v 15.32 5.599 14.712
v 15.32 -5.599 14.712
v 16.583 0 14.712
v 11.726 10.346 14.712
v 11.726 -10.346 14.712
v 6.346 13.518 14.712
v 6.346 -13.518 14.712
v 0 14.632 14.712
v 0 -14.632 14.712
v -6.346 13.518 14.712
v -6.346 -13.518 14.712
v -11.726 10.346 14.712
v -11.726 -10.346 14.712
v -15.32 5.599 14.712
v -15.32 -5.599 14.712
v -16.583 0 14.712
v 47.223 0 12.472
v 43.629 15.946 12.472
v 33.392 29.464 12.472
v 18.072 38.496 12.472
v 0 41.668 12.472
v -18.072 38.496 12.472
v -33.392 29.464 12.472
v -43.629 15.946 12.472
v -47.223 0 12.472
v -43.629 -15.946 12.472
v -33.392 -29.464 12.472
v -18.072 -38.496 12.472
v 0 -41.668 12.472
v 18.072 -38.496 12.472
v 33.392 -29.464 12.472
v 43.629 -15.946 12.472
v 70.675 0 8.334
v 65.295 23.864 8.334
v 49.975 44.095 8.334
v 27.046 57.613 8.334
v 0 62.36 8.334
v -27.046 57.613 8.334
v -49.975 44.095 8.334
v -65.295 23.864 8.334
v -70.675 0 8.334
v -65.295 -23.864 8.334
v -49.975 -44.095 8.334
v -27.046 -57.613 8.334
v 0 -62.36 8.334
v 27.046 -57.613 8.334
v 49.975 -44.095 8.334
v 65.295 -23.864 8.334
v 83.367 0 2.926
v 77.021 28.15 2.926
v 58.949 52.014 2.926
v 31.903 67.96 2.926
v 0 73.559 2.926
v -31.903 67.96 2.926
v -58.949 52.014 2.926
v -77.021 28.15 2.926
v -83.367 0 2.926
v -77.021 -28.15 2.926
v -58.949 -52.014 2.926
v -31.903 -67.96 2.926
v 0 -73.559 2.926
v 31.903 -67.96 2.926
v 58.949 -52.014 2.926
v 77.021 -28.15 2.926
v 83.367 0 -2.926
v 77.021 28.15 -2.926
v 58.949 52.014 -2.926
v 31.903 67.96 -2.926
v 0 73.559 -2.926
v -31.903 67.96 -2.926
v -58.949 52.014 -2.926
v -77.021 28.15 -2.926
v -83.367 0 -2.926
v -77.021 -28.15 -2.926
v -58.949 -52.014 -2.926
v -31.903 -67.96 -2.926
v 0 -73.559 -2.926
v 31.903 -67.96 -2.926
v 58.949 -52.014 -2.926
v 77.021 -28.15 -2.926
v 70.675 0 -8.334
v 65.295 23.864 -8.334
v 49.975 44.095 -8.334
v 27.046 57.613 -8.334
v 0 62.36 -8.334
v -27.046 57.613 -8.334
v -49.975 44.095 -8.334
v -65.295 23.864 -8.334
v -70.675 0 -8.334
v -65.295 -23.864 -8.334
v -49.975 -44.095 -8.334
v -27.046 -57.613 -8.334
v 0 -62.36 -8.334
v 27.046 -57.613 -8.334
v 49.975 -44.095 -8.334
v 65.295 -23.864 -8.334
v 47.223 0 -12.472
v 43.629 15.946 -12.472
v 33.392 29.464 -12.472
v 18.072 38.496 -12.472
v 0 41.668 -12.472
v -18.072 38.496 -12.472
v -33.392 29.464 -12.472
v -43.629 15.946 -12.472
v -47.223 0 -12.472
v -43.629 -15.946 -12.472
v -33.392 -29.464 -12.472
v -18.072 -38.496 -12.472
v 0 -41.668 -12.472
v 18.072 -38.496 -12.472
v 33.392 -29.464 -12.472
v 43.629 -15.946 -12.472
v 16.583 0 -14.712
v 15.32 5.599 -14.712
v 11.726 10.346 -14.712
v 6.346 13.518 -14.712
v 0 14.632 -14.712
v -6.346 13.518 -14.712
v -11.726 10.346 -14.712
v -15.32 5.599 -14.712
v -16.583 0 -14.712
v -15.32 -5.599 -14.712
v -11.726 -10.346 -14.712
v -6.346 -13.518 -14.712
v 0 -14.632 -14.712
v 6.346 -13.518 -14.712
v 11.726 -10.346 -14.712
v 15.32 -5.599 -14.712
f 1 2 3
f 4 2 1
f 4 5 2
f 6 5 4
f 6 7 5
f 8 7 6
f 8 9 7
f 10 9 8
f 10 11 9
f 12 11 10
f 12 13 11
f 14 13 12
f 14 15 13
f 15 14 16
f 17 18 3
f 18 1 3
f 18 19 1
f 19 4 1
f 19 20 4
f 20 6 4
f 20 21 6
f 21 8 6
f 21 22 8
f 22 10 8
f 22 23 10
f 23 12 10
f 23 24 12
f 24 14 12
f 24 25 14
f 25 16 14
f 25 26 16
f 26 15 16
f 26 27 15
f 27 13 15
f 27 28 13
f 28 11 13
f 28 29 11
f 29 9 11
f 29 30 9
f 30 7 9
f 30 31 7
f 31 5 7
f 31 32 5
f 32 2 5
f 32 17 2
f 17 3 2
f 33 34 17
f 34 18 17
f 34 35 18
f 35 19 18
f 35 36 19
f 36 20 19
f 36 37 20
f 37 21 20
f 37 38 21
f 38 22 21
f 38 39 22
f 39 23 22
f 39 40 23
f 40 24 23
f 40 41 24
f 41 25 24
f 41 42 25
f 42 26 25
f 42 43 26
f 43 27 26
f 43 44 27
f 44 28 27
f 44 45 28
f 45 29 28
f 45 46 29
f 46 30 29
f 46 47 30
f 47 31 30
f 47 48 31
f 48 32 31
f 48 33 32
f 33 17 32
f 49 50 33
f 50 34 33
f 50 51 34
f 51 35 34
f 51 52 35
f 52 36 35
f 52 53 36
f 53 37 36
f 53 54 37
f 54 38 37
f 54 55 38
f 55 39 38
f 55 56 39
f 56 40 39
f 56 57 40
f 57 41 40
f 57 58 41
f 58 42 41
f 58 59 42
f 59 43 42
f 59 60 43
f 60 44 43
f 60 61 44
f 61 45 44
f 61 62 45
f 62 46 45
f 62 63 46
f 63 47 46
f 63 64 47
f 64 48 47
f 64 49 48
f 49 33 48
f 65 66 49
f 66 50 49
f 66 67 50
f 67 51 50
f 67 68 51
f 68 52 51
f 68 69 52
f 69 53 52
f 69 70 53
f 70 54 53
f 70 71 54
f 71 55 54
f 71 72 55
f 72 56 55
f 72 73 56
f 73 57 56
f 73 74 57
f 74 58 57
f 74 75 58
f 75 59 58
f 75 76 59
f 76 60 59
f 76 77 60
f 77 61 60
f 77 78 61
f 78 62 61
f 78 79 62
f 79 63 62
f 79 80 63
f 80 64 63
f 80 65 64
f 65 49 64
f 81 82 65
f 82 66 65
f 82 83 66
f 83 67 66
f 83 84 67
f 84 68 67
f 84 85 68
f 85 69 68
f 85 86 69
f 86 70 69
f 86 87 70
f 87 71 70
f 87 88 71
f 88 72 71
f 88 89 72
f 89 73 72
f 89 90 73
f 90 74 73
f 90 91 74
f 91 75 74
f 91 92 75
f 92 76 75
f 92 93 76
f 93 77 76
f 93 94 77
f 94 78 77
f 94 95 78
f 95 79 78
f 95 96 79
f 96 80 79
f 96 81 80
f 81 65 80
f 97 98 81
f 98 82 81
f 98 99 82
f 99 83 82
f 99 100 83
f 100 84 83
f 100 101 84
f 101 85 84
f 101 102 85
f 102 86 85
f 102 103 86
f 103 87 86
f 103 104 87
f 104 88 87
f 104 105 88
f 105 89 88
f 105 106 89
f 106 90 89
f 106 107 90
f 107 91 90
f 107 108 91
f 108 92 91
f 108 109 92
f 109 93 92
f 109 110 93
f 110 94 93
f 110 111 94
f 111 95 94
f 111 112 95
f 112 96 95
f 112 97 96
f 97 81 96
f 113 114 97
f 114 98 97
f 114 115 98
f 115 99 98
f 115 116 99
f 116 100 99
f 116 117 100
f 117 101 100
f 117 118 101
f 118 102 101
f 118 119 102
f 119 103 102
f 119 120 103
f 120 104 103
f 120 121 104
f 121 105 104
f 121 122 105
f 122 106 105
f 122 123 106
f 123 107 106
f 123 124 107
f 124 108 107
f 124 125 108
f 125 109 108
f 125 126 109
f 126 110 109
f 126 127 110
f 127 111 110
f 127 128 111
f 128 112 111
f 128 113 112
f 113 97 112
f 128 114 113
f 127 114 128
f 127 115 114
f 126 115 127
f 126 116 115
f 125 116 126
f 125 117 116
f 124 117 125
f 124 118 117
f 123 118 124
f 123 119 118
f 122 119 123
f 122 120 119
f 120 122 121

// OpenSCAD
// Generated by SolidPython 1.0.1 on 2020-07-29 00:46:53


scale(v = [17, 15, 3]) {
	sphere(r = 5);
}
/***********************************************
*********      SolidPython code:      **********
************************************************
 
# import packages: SolidPython
from solid import *
from solid.utils import *
from itertools import chain, combinations, permutations


class Resize:

    def __init__(self, scad_file):
        self.scad_file = scad_file
        #self.scad_file = import_scad(scad_file)
        # cone/cylinder param:
        self.r1 = 0
        self.r2 = 0
        self.h = 0
        # rectangular prism param:
        self.w = 0
        self.l = 0
        # ellipse param:
        self.r = 0

    # import OpenScad code (file name corresponds to shape)


    # classify shape + parameters
    def assign(self, param1, param2, param3):
        if self.scad_file == 'cone.scad':
            self.r1 = param1
            self.r2 = param2
            self.h = param3
        elif self.scad_file == 'cylinder.scad':
            self.r1 = param1
            self.r2 = param2
            self.h = param3
        elif self.scad_file == 'rectangularPrism.scad':
            self.h = param1
            self.l = param2
            self.w = param3
        else:
            self.r = param1
            self.h = param2

    # resize parameters
    def iterate(self):
        x = range(3, 20, 2)
        i = 1
        if self.scad_file == 'cone.scad':
            tempList = list(permutations(x, 2))
            for temp in tempList:
                param1 = temp[0]
                param2 = temp[1]
                filepath = 'produced_scad_files/' + 'cone' + str(param1) + '_' + str(param2) + '_' + '.scad'
                scad_render_to_file(cylinder(h=param1, r1=param2, r2=0), filepath)

        elif self.scad_file == 'cylinder.scad':
            tempList = list(permutations(x, 3))
            for temp in tempList:
                param1 = temp[0]
                param2 = temp[1]
                filepath = 'produced_scad_files/' + 'cylinder' + str(param1) + '_' + str(param2) + '_' + '.scad'
                scad_render_to_file(cylinder(h=param1, r1=param2, r2=param2), filepath)

        elif self.scad_file == 'rectangularPrism.scad':
            tempList = list(permutations(x, 3))
            for temp in tempList:
                param1 = temp[0]
                param2 = temp[1]
                param3 = temp[2]
                filepath = 'produced_scad_files/' + 'rectangularPrism' + str(param1) + '_' + str(param2) + '_' + str(
                    param3) + '.scad'
                scad_render_to_file(cube(size=(param1, param2, param3)), filepath)

        elif self.scad_file == 'ellipse.scad':
            tempList = list(permutations(x, 4))
            for temp in tempList:
                param1 = temp[0]
                param2 = temp[1]
                param3 = temp[2]
                param4 = temp[3]
                filepath = 'produced_scad_files/' + 'ellipse' + str(param1) + '_' + str(param2) + '_' + str(param3) + '_' + str(param4) + '.scad'
                scad_render_to_file(scale([param1, param2, param3])(sphere(r=param4)), filepath)

    def render_to_scadfile(self):
        scad_render_to_file(scad, 'example.scad') 
 
************************************************/
